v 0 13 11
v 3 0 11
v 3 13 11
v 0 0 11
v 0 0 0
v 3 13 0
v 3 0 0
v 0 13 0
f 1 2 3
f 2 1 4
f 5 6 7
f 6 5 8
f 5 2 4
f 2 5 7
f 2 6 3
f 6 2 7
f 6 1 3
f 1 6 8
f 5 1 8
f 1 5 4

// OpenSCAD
// Generated by SolidPython 1.0.1 on 2020-07-29 00:46:54


cube(size = [3, 13, 11]);
/***********************************************
*********      SolidPython code:      **********
************************************************
 
# import packages: SolidPython
from solid import *
from solid.utils import *
from itertools import chain, combinations, permutations


class Resize:

    def __init__(self, scad_file):
        self.scad_file = scad_file
        #self.scad_file = import_scad(scad_file)
        # cone/cylinder param:
        self.r1 = 0
        self.r2 = 0
        self.h = 0
        # rectangular prism param:
        self.w = 0
        self.l = 0
        # ellipse param:
        self.r = 0

    # import OpenScad code (file name corresponds to shape)


    # classify shape + parameters
    def assign(self, param1, param2, param3):
        if self.scad_file == 'cone.scad':
            self.r1 = param1
            self.r2 = param2
            self.h = param3
        elif self.scad_file == 'cylinder.scad':
            self.r1 = param1
            self.r2 = param2
            self.h = param3
        elif self.scad_file == 'rectangularPrism.scad':
            self.h = param1
            self.l = param2
            self.w = param3
        else:
            self.r = param1
            self.h = param2

    # resize parameters
    def iterate(self):
        x = range(3, 20, 2)
        i = 1
        if self.scad_file == 'cone.scad':
            tempList = list(permutations(x, 2))
            for temp in tempList:
                param1 = temp[0]
                param2 = temp[1]
                filepath = 'produced_scad_files/' + 'cone' + str(param1) + '_' + str(param2) + '_' + '.scad'
                scad_render_to_file(cylinder(h=param1, r1=param2, r2=0), filepath)

        elif self.scad_file == 'cylinder.scad':
            tempList = list(permutations(x, 3))
            for temp in tempList:
                param1 = temp[0]
                param2 = temp[1]
                filepath = 'produced_scad_files/' + 'cylinder' + str(param1) + '_' + str(param2) + '_' + '.scad'
                scad_render_to_file(cylinder(h=param1, r1=param2, r2=param2), filepath)

        elif self.scad_file == 'rectangularPrism.scad':
            tempList = list(permutations(x, 3))
            for temp in tempList:
                param1 = temp[0]
                param2 = temp[1]
                param3 = temp[2]
                filepath = 'produced_scad_files/' + 'rectangularPrism' + str(param1) + '_' + str(param2) + '_' + str(
                    param3) + '.scad'
                scad_render_to_file(cube(size=(param1, param2, param3)), filepath)

        elif self.scad_file == 'ellipse.scad':
            tempList = list(permutations(x, 4))
            for temp in tempList:
                param1 = temp[0]
                param2 = temp[1]
                param3 = temp[2]
                param4 = temp[3]
                filepath = 'produced_scad_files/' + 'ellipse' + str(param1) + '_' + str(param2) + '_' + str(param3) + '_' + str(param4) + '.scad'
                scad_render_to_file(scale([param1, param2, param3])(sphere(r=param4)), filepath)

    def render_to_scadfile(self):
        scad_render_to_file(scad, 'example.scad') 
 
************************************************/
